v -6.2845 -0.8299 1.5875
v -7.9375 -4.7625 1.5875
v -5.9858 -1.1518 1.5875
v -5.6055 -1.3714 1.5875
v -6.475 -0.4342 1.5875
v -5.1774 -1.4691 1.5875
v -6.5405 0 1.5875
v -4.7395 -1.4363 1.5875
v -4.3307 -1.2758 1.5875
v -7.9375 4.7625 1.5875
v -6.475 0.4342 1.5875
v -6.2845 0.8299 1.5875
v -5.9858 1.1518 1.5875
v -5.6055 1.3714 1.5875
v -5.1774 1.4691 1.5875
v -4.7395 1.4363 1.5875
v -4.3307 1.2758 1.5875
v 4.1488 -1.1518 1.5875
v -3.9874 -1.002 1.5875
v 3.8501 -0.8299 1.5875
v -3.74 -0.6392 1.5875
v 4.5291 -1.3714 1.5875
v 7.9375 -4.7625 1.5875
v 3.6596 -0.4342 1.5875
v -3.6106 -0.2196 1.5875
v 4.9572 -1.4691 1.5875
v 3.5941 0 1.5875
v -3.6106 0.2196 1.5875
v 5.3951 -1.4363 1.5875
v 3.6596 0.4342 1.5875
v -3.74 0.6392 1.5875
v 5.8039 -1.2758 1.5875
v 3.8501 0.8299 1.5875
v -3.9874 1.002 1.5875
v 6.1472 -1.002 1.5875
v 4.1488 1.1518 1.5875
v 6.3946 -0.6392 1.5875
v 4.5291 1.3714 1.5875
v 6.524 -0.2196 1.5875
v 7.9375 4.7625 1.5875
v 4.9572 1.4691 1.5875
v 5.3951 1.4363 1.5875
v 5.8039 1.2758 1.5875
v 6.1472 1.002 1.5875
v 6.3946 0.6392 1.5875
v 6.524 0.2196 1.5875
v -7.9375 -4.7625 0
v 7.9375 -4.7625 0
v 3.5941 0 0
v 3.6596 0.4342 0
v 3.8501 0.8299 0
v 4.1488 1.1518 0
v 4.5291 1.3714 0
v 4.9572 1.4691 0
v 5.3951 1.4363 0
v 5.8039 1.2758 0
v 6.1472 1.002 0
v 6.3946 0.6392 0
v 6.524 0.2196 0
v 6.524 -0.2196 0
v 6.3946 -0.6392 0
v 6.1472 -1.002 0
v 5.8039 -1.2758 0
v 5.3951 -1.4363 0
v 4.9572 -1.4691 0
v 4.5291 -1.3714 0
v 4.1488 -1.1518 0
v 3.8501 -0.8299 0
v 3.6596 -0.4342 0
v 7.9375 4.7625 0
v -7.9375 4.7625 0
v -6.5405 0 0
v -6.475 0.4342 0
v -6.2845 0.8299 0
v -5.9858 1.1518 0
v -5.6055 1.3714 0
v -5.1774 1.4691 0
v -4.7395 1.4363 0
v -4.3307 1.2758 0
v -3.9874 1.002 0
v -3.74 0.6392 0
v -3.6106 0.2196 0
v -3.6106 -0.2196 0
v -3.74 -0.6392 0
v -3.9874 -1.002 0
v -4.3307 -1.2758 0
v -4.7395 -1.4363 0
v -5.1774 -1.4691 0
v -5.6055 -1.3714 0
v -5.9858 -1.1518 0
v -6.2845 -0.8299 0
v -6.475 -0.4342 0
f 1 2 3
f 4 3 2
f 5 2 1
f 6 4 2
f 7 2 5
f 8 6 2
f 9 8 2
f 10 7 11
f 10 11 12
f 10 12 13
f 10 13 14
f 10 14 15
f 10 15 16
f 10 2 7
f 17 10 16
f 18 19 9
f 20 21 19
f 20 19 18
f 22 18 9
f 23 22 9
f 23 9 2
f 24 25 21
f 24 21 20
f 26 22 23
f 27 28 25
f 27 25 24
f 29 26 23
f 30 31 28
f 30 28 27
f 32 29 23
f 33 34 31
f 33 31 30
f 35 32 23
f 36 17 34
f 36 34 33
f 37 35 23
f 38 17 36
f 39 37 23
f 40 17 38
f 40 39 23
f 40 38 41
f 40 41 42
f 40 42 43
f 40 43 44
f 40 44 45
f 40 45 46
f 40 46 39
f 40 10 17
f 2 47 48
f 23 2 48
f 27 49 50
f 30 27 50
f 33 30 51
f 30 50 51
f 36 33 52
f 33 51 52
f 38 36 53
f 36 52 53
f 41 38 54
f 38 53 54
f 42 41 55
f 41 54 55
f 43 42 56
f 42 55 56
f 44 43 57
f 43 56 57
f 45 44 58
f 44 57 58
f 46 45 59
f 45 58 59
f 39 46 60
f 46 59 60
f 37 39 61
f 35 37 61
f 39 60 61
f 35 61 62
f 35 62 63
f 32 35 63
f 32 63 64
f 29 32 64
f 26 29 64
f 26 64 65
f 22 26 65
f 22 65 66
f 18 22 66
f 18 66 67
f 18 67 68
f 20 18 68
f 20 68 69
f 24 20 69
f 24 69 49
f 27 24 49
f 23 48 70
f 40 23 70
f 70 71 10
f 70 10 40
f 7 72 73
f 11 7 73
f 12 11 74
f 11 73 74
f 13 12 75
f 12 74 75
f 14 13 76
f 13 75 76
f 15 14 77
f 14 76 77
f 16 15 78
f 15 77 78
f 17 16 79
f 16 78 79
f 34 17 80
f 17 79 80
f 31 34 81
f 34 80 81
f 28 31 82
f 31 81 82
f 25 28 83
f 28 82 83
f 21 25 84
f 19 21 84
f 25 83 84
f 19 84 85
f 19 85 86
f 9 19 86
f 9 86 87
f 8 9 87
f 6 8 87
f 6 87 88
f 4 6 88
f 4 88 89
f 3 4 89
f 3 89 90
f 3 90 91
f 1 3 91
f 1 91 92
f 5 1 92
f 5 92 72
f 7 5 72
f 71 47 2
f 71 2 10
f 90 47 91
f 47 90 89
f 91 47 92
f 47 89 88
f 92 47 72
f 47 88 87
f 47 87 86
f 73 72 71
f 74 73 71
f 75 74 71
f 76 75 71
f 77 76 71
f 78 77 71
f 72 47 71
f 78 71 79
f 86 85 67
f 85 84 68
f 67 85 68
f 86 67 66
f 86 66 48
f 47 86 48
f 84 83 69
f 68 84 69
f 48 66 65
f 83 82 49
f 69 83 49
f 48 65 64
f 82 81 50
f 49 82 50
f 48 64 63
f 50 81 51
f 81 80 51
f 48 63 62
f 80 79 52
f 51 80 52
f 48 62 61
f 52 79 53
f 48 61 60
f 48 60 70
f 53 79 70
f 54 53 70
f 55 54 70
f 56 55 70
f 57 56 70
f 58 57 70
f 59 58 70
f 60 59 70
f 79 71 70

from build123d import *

# Parameters (mm, degrees)
SKETCH1_W                 = 15.875
SKETCH1_H                 = 9.525
BOSS_EXTRUDE1_DEPTH       = 1.5875
F_4_CLEARANCE_HOLE1_D     = 2.9464
F_4_CLEARANCE_HOLE1_DEPTH = 1.5875


with BuildPart() as part:
    # Sketch1 → Boss-Extrude1 (new body)
    with BuildSketch(Plane.XY):
        Rectangle(SKETCH1_W, SKETCH1_H)
    extrude(amount=BOSS_EXTRUDE1_DEPTH)

    # #4 Clearance Hole1
    with Locations(Plane.XY.offset(1.5875)):
        with Locations((-5.0673, 0), (5.0673, 0)):
            Hole(F_4_CLEARANCE_HOLE1_D / 2, depth=F_4_CLEARANCE_HOLE1_DEPTH)


solid = part.part
